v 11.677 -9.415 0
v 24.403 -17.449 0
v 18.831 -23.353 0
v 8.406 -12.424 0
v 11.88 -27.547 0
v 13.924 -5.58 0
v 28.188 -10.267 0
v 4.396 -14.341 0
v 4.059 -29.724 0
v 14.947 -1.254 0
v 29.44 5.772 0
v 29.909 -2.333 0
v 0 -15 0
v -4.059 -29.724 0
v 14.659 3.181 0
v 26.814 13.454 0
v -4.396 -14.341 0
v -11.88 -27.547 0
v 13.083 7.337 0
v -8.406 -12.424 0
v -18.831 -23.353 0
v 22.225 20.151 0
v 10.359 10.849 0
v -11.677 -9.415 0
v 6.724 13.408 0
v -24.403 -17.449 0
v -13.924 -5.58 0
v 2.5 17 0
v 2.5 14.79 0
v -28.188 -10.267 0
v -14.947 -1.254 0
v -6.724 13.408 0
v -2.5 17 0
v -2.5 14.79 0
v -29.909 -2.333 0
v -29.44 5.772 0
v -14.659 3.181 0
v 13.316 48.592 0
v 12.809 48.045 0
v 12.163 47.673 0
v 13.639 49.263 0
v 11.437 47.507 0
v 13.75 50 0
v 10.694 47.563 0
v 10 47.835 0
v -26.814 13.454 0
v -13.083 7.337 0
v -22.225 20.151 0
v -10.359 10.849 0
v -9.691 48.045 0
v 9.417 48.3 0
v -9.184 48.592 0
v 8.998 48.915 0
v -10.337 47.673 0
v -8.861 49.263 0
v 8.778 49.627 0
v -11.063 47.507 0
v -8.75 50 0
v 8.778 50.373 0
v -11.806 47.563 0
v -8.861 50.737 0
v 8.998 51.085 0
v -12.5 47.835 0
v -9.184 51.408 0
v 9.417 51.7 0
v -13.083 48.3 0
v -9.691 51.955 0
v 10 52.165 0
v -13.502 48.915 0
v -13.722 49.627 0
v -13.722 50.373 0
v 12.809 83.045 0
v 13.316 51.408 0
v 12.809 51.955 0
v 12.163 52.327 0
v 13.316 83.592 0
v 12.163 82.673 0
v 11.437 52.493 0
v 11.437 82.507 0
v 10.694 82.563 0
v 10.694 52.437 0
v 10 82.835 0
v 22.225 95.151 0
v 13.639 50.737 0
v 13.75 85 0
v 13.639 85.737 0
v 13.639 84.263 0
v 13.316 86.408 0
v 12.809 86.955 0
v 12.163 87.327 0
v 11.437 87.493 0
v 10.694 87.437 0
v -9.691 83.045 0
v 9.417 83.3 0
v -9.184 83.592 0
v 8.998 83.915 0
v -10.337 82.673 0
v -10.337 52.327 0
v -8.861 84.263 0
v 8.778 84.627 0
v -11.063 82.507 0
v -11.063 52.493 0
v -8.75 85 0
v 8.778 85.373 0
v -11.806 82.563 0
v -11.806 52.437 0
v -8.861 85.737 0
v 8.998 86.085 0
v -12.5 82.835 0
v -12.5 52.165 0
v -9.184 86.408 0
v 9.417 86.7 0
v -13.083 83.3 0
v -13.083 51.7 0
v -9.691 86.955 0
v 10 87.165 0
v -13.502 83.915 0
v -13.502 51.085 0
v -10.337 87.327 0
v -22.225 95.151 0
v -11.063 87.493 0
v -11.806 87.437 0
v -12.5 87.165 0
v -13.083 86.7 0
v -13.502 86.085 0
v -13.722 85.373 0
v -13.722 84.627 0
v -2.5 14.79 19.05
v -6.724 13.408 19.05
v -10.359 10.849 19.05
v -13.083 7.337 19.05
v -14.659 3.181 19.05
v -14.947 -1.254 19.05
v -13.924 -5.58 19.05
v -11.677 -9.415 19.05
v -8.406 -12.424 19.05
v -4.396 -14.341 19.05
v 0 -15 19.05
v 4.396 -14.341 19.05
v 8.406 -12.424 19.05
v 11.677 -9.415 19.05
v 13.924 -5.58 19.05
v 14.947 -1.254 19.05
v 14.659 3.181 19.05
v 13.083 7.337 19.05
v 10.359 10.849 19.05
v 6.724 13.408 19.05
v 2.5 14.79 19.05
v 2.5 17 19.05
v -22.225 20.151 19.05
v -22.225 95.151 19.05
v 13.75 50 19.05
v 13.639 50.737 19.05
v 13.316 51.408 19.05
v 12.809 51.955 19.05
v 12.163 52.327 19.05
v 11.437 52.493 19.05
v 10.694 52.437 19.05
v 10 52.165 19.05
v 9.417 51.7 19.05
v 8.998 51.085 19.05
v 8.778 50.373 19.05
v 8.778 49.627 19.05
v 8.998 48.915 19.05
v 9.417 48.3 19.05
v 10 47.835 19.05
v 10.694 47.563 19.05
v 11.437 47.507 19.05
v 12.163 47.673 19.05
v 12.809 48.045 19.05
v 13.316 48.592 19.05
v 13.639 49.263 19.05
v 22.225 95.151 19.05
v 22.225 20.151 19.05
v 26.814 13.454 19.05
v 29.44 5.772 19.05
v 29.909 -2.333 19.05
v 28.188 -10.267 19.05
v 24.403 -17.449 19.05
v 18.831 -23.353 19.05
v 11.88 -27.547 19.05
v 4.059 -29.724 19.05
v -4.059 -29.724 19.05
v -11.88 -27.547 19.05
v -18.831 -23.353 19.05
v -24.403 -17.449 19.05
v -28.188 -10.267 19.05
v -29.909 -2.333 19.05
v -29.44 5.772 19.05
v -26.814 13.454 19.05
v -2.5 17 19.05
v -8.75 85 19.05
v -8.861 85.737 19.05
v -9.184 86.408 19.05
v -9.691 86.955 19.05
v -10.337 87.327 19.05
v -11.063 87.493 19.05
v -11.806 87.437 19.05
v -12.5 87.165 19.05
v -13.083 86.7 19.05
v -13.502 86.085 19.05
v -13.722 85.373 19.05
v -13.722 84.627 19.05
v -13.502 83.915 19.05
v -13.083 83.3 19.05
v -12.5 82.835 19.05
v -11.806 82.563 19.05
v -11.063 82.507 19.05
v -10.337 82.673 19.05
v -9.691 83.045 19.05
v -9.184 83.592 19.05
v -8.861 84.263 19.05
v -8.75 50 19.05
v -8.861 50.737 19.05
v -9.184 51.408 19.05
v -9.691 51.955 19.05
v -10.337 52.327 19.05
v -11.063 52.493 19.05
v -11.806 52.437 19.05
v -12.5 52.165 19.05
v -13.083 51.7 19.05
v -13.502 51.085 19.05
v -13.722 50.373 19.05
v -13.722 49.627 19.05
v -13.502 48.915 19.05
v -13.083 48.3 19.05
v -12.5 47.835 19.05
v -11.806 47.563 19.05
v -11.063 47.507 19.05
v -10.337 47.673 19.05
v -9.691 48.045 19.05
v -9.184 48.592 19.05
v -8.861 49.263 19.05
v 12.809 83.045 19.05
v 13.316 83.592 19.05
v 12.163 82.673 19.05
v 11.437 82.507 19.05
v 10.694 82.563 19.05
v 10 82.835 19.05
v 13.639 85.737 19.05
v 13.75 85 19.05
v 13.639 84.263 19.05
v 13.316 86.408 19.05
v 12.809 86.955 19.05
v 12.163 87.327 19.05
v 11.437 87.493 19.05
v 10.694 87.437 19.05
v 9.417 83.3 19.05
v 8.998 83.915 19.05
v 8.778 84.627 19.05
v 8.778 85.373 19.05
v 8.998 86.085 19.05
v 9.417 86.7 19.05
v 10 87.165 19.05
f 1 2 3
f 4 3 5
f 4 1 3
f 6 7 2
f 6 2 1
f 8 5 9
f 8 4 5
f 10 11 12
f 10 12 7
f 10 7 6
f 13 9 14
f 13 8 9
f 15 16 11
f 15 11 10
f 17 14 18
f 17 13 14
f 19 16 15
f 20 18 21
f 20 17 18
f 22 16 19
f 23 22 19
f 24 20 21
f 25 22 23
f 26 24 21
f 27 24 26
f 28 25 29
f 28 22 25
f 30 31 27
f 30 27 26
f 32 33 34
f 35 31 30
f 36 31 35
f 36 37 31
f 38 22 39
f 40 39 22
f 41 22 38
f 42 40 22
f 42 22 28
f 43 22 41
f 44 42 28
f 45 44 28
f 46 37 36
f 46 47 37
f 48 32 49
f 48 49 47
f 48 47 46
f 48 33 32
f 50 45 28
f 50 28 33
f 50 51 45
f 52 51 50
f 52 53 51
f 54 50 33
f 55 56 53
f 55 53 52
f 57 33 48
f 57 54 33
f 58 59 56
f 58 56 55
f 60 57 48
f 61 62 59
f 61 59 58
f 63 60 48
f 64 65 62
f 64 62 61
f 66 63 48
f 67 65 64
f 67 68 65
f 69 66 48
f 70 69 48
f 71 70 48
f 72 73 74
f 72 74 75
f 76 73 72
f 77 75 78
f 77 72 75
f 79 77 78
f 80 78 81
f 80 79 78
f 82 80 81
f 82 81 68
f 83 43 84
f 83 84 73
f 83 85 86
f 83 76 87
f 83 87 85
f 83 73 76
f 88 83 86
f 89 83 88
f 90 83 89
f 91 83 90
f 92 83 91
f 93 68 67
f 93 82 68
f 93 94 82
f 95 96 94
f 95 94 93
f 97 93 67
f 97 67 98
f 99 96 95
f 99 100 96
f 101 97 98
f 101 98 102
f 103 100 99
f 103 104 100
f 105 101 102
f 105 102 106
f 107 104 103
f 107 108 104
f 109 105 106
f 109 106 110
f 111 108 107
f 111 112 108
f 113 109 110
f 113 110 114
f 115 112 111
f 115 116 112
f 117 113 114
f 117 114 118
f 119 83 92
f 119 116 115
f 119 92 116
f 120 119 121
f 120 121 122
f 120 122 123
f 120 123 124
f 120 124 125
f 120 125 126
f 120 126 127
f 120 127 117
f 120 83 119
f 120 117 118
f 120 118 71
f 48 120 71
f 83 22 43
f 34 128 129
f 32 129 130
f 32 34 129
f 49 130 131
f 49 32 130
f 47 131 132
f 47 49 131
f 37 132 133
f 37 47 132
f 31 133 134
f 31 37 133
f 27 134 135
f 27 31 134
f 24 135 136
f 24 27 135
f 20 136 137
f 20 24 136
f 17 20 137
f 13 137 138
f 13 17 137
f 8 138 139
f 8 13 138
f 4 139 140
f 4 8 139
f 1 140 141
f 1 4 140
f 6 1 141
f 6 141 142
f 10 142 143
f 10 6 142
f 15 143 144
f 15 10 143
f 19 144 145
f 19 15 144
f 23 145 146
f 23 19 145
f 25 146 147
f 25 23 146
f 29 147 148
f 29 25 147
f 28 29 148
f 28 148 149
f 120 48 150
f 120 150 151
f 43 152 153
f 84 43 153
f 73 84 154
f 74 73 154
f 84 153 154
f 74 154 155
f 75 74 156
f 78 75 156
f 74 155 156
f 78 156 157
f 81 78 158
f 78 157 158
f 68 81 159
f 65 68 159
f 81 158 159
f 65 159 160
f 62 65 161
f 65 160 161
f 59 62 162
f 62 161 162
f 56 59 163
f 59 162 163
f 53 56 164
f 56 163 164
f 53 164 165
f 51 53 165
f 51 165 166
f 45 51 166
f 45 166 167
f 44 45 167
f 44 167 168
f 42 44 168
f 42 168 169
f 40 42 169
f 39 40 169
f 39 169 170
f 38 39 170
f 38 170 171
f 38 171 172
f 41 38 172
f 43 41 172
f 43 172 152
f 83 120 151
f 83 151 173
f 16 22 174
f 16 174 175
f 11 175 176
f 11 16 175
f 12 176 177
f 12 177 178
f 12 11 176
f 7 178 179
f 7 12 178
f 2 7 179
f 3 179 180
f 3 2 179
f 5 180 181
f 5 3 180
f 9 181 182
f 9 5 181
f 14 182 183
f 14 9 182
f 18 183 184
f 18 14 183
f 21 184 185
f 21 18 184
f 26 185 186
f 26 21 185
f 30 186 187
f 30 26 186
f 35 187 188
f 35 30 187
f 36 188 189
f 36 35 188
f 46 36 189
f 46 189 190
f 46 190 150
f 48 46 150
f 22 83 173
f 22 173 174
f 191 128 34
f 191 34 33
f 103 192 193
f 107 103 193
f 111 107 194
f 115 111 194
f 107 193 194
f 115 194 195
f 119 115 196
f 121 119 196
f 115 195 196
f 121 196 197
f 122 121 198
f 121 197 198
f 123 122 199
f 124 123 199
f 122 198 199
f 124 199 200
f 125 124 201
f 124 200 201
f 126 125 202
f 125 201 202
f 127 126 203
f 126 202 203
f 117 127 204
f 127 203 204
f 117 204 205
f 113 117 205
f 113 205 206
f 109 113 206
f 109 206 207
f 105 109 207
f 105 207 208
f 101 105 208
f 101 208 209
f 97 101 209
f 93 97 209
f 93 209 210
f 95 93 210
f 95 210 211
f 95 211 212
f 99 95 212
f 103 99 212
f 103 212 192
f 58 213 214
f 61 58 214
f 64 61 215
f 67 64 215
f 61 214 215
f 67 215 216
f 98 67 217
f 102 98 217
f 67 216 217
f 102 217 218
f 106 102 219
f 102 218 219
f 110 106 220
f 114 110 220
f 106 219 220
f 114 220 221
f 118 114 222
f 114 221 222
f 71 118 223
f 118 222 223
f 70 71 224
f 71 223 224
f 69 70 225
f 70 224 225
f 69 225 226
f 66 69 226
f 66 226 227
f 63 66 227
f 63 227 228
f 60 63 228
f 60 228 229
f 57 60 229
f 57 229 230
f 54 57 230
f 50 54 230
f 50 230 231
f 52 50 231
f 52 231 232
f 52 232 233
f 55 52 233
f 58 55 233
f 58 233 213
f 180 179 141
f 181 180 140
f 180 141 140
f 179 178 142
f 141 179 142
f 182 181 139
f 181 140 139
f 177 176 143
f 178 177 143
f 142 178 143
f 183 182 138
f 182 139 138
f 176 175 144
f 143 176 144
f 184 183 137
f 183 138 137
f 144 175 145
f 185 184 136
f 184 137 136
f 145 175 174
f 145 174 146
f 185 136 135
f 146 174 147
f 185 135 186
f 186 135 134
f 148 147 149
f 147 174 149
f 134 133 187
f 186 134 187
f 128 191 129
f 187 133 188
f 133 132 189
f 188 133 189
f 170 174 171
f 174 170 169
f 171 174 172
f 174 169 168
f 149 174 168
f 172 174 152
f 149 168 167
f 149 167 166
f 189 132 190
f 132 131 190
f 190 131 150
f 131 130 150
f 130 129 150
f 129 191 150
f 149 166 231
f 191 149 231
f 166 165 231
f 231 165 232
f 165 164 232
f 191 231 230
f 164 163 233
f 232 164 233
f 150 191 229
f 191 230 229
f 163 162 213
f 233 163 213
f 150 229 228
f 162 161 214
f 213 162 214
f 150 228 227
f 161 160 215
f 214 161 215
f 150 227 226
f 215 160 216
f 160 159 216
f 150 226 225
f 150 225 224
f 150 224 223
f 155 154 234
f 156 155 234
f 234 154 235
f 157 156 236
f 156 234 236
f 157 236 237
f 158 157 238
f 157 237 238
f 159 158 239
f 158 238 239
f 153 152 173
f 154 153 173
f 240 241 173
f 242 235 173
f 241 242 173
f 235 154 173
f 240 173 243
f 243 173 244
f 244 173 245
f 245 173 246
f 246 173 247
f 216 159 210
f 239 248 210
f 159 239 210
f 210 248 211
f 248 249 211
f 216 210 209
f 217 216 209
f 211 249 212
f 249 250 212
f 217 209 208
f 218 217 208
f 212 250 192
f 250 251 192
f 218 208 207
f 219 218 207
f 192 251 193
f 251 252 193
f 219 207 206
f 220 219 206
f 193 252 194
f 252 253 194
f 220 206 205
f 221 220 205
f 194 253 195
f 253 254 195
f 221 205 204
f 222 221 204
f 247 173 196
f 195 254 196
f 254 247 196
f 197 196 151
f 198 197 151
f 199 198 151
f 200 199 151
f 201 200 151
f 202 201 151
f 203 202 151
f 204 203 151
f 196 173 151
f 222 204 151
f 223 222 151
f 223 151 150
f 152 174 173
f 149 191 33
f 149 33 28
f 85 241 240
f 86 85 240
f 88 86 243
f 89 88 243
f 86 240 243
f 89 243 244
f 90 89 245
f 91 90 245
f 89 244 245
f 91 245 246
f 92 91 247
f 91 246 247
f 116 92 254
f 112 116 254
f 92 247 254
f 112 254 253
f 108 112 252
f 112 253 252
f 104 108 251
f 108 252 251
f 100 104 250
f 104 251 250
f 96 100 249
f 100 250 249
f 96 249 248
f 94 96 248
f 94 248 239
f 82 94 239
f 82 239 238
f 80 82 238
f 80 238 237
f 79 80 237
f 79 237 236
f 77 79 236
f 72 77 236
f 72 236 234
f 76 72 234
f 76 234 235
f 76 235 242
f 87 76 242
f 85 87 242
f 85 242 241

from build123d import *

# Parameters (mm, degrees)
SKETCH1_R           = 15
BOSS_EXTRUDE1_DEPTH = 19.05
SKETCH2_W           = 5
SKETCH2_H           = 17
CUT_EXTRUDE1_DEPTH  = 102.570428297
SKETCH3_R           = 2.5
CUT_EXTRUDE2_DEPTH  = 102.570428297


with BuildPart() as part:
    # Sketch1 → Boss-Extrude1 (new body)
    with BuildSketch(Plane.XY):
        with BuildLine():
            Line((-22.225, 20.150666862), (-22.225, 95.150666862))
            Line((-22.225, 95.150666862), (22.225, 95.150666862))
            Line((22.225, 95.150666862), (22.225, 20.150666862))
            ThreePointArc((22.225, 20.150666862), (0, -30), (-22.225, 20.150666862))
        make_face()
        with Locations(Location((0, 0, 0), (0, 0, 180))):
            Circle(SKETCH1_R, mode=Mode.SUBTRACT)
    extrude(amount=BOSS_EXTRUDE1_DEPTH)

    # Sketch2 → Cut-Extrude1 (cut, through all)
    with BuildSketch(Plane.XY.offset(19.05)):
        with Locations((0, 8.5)):
            Rectangle(SKETCH2_W, SKETCH2_H)
    extrude(amount=-CUT_EXTRUDE1_DEPTH, mode=Mode.SUBTRACT)

    # Sketch3 → Cut-Extrude2 (cut, through all)
    with BuildSketch(Plane.XY.offset(19.05)):
        with Locations((-11.25, 85)):
            Circle(SKETCH3_R)
        with Locations((11.25, 85)):
            Circle(SKETCH3_R)
        with Locations((11.25, 50)):
            Circle(SKETCH3_R)
        with Locations((-11.25, 50)):
            Circle(SKETCH3_R)
    extrude(amount=-CUT_EXTRUDE2_DEPTH, mode=Mode.SUBTRACT)


solid = part.part
